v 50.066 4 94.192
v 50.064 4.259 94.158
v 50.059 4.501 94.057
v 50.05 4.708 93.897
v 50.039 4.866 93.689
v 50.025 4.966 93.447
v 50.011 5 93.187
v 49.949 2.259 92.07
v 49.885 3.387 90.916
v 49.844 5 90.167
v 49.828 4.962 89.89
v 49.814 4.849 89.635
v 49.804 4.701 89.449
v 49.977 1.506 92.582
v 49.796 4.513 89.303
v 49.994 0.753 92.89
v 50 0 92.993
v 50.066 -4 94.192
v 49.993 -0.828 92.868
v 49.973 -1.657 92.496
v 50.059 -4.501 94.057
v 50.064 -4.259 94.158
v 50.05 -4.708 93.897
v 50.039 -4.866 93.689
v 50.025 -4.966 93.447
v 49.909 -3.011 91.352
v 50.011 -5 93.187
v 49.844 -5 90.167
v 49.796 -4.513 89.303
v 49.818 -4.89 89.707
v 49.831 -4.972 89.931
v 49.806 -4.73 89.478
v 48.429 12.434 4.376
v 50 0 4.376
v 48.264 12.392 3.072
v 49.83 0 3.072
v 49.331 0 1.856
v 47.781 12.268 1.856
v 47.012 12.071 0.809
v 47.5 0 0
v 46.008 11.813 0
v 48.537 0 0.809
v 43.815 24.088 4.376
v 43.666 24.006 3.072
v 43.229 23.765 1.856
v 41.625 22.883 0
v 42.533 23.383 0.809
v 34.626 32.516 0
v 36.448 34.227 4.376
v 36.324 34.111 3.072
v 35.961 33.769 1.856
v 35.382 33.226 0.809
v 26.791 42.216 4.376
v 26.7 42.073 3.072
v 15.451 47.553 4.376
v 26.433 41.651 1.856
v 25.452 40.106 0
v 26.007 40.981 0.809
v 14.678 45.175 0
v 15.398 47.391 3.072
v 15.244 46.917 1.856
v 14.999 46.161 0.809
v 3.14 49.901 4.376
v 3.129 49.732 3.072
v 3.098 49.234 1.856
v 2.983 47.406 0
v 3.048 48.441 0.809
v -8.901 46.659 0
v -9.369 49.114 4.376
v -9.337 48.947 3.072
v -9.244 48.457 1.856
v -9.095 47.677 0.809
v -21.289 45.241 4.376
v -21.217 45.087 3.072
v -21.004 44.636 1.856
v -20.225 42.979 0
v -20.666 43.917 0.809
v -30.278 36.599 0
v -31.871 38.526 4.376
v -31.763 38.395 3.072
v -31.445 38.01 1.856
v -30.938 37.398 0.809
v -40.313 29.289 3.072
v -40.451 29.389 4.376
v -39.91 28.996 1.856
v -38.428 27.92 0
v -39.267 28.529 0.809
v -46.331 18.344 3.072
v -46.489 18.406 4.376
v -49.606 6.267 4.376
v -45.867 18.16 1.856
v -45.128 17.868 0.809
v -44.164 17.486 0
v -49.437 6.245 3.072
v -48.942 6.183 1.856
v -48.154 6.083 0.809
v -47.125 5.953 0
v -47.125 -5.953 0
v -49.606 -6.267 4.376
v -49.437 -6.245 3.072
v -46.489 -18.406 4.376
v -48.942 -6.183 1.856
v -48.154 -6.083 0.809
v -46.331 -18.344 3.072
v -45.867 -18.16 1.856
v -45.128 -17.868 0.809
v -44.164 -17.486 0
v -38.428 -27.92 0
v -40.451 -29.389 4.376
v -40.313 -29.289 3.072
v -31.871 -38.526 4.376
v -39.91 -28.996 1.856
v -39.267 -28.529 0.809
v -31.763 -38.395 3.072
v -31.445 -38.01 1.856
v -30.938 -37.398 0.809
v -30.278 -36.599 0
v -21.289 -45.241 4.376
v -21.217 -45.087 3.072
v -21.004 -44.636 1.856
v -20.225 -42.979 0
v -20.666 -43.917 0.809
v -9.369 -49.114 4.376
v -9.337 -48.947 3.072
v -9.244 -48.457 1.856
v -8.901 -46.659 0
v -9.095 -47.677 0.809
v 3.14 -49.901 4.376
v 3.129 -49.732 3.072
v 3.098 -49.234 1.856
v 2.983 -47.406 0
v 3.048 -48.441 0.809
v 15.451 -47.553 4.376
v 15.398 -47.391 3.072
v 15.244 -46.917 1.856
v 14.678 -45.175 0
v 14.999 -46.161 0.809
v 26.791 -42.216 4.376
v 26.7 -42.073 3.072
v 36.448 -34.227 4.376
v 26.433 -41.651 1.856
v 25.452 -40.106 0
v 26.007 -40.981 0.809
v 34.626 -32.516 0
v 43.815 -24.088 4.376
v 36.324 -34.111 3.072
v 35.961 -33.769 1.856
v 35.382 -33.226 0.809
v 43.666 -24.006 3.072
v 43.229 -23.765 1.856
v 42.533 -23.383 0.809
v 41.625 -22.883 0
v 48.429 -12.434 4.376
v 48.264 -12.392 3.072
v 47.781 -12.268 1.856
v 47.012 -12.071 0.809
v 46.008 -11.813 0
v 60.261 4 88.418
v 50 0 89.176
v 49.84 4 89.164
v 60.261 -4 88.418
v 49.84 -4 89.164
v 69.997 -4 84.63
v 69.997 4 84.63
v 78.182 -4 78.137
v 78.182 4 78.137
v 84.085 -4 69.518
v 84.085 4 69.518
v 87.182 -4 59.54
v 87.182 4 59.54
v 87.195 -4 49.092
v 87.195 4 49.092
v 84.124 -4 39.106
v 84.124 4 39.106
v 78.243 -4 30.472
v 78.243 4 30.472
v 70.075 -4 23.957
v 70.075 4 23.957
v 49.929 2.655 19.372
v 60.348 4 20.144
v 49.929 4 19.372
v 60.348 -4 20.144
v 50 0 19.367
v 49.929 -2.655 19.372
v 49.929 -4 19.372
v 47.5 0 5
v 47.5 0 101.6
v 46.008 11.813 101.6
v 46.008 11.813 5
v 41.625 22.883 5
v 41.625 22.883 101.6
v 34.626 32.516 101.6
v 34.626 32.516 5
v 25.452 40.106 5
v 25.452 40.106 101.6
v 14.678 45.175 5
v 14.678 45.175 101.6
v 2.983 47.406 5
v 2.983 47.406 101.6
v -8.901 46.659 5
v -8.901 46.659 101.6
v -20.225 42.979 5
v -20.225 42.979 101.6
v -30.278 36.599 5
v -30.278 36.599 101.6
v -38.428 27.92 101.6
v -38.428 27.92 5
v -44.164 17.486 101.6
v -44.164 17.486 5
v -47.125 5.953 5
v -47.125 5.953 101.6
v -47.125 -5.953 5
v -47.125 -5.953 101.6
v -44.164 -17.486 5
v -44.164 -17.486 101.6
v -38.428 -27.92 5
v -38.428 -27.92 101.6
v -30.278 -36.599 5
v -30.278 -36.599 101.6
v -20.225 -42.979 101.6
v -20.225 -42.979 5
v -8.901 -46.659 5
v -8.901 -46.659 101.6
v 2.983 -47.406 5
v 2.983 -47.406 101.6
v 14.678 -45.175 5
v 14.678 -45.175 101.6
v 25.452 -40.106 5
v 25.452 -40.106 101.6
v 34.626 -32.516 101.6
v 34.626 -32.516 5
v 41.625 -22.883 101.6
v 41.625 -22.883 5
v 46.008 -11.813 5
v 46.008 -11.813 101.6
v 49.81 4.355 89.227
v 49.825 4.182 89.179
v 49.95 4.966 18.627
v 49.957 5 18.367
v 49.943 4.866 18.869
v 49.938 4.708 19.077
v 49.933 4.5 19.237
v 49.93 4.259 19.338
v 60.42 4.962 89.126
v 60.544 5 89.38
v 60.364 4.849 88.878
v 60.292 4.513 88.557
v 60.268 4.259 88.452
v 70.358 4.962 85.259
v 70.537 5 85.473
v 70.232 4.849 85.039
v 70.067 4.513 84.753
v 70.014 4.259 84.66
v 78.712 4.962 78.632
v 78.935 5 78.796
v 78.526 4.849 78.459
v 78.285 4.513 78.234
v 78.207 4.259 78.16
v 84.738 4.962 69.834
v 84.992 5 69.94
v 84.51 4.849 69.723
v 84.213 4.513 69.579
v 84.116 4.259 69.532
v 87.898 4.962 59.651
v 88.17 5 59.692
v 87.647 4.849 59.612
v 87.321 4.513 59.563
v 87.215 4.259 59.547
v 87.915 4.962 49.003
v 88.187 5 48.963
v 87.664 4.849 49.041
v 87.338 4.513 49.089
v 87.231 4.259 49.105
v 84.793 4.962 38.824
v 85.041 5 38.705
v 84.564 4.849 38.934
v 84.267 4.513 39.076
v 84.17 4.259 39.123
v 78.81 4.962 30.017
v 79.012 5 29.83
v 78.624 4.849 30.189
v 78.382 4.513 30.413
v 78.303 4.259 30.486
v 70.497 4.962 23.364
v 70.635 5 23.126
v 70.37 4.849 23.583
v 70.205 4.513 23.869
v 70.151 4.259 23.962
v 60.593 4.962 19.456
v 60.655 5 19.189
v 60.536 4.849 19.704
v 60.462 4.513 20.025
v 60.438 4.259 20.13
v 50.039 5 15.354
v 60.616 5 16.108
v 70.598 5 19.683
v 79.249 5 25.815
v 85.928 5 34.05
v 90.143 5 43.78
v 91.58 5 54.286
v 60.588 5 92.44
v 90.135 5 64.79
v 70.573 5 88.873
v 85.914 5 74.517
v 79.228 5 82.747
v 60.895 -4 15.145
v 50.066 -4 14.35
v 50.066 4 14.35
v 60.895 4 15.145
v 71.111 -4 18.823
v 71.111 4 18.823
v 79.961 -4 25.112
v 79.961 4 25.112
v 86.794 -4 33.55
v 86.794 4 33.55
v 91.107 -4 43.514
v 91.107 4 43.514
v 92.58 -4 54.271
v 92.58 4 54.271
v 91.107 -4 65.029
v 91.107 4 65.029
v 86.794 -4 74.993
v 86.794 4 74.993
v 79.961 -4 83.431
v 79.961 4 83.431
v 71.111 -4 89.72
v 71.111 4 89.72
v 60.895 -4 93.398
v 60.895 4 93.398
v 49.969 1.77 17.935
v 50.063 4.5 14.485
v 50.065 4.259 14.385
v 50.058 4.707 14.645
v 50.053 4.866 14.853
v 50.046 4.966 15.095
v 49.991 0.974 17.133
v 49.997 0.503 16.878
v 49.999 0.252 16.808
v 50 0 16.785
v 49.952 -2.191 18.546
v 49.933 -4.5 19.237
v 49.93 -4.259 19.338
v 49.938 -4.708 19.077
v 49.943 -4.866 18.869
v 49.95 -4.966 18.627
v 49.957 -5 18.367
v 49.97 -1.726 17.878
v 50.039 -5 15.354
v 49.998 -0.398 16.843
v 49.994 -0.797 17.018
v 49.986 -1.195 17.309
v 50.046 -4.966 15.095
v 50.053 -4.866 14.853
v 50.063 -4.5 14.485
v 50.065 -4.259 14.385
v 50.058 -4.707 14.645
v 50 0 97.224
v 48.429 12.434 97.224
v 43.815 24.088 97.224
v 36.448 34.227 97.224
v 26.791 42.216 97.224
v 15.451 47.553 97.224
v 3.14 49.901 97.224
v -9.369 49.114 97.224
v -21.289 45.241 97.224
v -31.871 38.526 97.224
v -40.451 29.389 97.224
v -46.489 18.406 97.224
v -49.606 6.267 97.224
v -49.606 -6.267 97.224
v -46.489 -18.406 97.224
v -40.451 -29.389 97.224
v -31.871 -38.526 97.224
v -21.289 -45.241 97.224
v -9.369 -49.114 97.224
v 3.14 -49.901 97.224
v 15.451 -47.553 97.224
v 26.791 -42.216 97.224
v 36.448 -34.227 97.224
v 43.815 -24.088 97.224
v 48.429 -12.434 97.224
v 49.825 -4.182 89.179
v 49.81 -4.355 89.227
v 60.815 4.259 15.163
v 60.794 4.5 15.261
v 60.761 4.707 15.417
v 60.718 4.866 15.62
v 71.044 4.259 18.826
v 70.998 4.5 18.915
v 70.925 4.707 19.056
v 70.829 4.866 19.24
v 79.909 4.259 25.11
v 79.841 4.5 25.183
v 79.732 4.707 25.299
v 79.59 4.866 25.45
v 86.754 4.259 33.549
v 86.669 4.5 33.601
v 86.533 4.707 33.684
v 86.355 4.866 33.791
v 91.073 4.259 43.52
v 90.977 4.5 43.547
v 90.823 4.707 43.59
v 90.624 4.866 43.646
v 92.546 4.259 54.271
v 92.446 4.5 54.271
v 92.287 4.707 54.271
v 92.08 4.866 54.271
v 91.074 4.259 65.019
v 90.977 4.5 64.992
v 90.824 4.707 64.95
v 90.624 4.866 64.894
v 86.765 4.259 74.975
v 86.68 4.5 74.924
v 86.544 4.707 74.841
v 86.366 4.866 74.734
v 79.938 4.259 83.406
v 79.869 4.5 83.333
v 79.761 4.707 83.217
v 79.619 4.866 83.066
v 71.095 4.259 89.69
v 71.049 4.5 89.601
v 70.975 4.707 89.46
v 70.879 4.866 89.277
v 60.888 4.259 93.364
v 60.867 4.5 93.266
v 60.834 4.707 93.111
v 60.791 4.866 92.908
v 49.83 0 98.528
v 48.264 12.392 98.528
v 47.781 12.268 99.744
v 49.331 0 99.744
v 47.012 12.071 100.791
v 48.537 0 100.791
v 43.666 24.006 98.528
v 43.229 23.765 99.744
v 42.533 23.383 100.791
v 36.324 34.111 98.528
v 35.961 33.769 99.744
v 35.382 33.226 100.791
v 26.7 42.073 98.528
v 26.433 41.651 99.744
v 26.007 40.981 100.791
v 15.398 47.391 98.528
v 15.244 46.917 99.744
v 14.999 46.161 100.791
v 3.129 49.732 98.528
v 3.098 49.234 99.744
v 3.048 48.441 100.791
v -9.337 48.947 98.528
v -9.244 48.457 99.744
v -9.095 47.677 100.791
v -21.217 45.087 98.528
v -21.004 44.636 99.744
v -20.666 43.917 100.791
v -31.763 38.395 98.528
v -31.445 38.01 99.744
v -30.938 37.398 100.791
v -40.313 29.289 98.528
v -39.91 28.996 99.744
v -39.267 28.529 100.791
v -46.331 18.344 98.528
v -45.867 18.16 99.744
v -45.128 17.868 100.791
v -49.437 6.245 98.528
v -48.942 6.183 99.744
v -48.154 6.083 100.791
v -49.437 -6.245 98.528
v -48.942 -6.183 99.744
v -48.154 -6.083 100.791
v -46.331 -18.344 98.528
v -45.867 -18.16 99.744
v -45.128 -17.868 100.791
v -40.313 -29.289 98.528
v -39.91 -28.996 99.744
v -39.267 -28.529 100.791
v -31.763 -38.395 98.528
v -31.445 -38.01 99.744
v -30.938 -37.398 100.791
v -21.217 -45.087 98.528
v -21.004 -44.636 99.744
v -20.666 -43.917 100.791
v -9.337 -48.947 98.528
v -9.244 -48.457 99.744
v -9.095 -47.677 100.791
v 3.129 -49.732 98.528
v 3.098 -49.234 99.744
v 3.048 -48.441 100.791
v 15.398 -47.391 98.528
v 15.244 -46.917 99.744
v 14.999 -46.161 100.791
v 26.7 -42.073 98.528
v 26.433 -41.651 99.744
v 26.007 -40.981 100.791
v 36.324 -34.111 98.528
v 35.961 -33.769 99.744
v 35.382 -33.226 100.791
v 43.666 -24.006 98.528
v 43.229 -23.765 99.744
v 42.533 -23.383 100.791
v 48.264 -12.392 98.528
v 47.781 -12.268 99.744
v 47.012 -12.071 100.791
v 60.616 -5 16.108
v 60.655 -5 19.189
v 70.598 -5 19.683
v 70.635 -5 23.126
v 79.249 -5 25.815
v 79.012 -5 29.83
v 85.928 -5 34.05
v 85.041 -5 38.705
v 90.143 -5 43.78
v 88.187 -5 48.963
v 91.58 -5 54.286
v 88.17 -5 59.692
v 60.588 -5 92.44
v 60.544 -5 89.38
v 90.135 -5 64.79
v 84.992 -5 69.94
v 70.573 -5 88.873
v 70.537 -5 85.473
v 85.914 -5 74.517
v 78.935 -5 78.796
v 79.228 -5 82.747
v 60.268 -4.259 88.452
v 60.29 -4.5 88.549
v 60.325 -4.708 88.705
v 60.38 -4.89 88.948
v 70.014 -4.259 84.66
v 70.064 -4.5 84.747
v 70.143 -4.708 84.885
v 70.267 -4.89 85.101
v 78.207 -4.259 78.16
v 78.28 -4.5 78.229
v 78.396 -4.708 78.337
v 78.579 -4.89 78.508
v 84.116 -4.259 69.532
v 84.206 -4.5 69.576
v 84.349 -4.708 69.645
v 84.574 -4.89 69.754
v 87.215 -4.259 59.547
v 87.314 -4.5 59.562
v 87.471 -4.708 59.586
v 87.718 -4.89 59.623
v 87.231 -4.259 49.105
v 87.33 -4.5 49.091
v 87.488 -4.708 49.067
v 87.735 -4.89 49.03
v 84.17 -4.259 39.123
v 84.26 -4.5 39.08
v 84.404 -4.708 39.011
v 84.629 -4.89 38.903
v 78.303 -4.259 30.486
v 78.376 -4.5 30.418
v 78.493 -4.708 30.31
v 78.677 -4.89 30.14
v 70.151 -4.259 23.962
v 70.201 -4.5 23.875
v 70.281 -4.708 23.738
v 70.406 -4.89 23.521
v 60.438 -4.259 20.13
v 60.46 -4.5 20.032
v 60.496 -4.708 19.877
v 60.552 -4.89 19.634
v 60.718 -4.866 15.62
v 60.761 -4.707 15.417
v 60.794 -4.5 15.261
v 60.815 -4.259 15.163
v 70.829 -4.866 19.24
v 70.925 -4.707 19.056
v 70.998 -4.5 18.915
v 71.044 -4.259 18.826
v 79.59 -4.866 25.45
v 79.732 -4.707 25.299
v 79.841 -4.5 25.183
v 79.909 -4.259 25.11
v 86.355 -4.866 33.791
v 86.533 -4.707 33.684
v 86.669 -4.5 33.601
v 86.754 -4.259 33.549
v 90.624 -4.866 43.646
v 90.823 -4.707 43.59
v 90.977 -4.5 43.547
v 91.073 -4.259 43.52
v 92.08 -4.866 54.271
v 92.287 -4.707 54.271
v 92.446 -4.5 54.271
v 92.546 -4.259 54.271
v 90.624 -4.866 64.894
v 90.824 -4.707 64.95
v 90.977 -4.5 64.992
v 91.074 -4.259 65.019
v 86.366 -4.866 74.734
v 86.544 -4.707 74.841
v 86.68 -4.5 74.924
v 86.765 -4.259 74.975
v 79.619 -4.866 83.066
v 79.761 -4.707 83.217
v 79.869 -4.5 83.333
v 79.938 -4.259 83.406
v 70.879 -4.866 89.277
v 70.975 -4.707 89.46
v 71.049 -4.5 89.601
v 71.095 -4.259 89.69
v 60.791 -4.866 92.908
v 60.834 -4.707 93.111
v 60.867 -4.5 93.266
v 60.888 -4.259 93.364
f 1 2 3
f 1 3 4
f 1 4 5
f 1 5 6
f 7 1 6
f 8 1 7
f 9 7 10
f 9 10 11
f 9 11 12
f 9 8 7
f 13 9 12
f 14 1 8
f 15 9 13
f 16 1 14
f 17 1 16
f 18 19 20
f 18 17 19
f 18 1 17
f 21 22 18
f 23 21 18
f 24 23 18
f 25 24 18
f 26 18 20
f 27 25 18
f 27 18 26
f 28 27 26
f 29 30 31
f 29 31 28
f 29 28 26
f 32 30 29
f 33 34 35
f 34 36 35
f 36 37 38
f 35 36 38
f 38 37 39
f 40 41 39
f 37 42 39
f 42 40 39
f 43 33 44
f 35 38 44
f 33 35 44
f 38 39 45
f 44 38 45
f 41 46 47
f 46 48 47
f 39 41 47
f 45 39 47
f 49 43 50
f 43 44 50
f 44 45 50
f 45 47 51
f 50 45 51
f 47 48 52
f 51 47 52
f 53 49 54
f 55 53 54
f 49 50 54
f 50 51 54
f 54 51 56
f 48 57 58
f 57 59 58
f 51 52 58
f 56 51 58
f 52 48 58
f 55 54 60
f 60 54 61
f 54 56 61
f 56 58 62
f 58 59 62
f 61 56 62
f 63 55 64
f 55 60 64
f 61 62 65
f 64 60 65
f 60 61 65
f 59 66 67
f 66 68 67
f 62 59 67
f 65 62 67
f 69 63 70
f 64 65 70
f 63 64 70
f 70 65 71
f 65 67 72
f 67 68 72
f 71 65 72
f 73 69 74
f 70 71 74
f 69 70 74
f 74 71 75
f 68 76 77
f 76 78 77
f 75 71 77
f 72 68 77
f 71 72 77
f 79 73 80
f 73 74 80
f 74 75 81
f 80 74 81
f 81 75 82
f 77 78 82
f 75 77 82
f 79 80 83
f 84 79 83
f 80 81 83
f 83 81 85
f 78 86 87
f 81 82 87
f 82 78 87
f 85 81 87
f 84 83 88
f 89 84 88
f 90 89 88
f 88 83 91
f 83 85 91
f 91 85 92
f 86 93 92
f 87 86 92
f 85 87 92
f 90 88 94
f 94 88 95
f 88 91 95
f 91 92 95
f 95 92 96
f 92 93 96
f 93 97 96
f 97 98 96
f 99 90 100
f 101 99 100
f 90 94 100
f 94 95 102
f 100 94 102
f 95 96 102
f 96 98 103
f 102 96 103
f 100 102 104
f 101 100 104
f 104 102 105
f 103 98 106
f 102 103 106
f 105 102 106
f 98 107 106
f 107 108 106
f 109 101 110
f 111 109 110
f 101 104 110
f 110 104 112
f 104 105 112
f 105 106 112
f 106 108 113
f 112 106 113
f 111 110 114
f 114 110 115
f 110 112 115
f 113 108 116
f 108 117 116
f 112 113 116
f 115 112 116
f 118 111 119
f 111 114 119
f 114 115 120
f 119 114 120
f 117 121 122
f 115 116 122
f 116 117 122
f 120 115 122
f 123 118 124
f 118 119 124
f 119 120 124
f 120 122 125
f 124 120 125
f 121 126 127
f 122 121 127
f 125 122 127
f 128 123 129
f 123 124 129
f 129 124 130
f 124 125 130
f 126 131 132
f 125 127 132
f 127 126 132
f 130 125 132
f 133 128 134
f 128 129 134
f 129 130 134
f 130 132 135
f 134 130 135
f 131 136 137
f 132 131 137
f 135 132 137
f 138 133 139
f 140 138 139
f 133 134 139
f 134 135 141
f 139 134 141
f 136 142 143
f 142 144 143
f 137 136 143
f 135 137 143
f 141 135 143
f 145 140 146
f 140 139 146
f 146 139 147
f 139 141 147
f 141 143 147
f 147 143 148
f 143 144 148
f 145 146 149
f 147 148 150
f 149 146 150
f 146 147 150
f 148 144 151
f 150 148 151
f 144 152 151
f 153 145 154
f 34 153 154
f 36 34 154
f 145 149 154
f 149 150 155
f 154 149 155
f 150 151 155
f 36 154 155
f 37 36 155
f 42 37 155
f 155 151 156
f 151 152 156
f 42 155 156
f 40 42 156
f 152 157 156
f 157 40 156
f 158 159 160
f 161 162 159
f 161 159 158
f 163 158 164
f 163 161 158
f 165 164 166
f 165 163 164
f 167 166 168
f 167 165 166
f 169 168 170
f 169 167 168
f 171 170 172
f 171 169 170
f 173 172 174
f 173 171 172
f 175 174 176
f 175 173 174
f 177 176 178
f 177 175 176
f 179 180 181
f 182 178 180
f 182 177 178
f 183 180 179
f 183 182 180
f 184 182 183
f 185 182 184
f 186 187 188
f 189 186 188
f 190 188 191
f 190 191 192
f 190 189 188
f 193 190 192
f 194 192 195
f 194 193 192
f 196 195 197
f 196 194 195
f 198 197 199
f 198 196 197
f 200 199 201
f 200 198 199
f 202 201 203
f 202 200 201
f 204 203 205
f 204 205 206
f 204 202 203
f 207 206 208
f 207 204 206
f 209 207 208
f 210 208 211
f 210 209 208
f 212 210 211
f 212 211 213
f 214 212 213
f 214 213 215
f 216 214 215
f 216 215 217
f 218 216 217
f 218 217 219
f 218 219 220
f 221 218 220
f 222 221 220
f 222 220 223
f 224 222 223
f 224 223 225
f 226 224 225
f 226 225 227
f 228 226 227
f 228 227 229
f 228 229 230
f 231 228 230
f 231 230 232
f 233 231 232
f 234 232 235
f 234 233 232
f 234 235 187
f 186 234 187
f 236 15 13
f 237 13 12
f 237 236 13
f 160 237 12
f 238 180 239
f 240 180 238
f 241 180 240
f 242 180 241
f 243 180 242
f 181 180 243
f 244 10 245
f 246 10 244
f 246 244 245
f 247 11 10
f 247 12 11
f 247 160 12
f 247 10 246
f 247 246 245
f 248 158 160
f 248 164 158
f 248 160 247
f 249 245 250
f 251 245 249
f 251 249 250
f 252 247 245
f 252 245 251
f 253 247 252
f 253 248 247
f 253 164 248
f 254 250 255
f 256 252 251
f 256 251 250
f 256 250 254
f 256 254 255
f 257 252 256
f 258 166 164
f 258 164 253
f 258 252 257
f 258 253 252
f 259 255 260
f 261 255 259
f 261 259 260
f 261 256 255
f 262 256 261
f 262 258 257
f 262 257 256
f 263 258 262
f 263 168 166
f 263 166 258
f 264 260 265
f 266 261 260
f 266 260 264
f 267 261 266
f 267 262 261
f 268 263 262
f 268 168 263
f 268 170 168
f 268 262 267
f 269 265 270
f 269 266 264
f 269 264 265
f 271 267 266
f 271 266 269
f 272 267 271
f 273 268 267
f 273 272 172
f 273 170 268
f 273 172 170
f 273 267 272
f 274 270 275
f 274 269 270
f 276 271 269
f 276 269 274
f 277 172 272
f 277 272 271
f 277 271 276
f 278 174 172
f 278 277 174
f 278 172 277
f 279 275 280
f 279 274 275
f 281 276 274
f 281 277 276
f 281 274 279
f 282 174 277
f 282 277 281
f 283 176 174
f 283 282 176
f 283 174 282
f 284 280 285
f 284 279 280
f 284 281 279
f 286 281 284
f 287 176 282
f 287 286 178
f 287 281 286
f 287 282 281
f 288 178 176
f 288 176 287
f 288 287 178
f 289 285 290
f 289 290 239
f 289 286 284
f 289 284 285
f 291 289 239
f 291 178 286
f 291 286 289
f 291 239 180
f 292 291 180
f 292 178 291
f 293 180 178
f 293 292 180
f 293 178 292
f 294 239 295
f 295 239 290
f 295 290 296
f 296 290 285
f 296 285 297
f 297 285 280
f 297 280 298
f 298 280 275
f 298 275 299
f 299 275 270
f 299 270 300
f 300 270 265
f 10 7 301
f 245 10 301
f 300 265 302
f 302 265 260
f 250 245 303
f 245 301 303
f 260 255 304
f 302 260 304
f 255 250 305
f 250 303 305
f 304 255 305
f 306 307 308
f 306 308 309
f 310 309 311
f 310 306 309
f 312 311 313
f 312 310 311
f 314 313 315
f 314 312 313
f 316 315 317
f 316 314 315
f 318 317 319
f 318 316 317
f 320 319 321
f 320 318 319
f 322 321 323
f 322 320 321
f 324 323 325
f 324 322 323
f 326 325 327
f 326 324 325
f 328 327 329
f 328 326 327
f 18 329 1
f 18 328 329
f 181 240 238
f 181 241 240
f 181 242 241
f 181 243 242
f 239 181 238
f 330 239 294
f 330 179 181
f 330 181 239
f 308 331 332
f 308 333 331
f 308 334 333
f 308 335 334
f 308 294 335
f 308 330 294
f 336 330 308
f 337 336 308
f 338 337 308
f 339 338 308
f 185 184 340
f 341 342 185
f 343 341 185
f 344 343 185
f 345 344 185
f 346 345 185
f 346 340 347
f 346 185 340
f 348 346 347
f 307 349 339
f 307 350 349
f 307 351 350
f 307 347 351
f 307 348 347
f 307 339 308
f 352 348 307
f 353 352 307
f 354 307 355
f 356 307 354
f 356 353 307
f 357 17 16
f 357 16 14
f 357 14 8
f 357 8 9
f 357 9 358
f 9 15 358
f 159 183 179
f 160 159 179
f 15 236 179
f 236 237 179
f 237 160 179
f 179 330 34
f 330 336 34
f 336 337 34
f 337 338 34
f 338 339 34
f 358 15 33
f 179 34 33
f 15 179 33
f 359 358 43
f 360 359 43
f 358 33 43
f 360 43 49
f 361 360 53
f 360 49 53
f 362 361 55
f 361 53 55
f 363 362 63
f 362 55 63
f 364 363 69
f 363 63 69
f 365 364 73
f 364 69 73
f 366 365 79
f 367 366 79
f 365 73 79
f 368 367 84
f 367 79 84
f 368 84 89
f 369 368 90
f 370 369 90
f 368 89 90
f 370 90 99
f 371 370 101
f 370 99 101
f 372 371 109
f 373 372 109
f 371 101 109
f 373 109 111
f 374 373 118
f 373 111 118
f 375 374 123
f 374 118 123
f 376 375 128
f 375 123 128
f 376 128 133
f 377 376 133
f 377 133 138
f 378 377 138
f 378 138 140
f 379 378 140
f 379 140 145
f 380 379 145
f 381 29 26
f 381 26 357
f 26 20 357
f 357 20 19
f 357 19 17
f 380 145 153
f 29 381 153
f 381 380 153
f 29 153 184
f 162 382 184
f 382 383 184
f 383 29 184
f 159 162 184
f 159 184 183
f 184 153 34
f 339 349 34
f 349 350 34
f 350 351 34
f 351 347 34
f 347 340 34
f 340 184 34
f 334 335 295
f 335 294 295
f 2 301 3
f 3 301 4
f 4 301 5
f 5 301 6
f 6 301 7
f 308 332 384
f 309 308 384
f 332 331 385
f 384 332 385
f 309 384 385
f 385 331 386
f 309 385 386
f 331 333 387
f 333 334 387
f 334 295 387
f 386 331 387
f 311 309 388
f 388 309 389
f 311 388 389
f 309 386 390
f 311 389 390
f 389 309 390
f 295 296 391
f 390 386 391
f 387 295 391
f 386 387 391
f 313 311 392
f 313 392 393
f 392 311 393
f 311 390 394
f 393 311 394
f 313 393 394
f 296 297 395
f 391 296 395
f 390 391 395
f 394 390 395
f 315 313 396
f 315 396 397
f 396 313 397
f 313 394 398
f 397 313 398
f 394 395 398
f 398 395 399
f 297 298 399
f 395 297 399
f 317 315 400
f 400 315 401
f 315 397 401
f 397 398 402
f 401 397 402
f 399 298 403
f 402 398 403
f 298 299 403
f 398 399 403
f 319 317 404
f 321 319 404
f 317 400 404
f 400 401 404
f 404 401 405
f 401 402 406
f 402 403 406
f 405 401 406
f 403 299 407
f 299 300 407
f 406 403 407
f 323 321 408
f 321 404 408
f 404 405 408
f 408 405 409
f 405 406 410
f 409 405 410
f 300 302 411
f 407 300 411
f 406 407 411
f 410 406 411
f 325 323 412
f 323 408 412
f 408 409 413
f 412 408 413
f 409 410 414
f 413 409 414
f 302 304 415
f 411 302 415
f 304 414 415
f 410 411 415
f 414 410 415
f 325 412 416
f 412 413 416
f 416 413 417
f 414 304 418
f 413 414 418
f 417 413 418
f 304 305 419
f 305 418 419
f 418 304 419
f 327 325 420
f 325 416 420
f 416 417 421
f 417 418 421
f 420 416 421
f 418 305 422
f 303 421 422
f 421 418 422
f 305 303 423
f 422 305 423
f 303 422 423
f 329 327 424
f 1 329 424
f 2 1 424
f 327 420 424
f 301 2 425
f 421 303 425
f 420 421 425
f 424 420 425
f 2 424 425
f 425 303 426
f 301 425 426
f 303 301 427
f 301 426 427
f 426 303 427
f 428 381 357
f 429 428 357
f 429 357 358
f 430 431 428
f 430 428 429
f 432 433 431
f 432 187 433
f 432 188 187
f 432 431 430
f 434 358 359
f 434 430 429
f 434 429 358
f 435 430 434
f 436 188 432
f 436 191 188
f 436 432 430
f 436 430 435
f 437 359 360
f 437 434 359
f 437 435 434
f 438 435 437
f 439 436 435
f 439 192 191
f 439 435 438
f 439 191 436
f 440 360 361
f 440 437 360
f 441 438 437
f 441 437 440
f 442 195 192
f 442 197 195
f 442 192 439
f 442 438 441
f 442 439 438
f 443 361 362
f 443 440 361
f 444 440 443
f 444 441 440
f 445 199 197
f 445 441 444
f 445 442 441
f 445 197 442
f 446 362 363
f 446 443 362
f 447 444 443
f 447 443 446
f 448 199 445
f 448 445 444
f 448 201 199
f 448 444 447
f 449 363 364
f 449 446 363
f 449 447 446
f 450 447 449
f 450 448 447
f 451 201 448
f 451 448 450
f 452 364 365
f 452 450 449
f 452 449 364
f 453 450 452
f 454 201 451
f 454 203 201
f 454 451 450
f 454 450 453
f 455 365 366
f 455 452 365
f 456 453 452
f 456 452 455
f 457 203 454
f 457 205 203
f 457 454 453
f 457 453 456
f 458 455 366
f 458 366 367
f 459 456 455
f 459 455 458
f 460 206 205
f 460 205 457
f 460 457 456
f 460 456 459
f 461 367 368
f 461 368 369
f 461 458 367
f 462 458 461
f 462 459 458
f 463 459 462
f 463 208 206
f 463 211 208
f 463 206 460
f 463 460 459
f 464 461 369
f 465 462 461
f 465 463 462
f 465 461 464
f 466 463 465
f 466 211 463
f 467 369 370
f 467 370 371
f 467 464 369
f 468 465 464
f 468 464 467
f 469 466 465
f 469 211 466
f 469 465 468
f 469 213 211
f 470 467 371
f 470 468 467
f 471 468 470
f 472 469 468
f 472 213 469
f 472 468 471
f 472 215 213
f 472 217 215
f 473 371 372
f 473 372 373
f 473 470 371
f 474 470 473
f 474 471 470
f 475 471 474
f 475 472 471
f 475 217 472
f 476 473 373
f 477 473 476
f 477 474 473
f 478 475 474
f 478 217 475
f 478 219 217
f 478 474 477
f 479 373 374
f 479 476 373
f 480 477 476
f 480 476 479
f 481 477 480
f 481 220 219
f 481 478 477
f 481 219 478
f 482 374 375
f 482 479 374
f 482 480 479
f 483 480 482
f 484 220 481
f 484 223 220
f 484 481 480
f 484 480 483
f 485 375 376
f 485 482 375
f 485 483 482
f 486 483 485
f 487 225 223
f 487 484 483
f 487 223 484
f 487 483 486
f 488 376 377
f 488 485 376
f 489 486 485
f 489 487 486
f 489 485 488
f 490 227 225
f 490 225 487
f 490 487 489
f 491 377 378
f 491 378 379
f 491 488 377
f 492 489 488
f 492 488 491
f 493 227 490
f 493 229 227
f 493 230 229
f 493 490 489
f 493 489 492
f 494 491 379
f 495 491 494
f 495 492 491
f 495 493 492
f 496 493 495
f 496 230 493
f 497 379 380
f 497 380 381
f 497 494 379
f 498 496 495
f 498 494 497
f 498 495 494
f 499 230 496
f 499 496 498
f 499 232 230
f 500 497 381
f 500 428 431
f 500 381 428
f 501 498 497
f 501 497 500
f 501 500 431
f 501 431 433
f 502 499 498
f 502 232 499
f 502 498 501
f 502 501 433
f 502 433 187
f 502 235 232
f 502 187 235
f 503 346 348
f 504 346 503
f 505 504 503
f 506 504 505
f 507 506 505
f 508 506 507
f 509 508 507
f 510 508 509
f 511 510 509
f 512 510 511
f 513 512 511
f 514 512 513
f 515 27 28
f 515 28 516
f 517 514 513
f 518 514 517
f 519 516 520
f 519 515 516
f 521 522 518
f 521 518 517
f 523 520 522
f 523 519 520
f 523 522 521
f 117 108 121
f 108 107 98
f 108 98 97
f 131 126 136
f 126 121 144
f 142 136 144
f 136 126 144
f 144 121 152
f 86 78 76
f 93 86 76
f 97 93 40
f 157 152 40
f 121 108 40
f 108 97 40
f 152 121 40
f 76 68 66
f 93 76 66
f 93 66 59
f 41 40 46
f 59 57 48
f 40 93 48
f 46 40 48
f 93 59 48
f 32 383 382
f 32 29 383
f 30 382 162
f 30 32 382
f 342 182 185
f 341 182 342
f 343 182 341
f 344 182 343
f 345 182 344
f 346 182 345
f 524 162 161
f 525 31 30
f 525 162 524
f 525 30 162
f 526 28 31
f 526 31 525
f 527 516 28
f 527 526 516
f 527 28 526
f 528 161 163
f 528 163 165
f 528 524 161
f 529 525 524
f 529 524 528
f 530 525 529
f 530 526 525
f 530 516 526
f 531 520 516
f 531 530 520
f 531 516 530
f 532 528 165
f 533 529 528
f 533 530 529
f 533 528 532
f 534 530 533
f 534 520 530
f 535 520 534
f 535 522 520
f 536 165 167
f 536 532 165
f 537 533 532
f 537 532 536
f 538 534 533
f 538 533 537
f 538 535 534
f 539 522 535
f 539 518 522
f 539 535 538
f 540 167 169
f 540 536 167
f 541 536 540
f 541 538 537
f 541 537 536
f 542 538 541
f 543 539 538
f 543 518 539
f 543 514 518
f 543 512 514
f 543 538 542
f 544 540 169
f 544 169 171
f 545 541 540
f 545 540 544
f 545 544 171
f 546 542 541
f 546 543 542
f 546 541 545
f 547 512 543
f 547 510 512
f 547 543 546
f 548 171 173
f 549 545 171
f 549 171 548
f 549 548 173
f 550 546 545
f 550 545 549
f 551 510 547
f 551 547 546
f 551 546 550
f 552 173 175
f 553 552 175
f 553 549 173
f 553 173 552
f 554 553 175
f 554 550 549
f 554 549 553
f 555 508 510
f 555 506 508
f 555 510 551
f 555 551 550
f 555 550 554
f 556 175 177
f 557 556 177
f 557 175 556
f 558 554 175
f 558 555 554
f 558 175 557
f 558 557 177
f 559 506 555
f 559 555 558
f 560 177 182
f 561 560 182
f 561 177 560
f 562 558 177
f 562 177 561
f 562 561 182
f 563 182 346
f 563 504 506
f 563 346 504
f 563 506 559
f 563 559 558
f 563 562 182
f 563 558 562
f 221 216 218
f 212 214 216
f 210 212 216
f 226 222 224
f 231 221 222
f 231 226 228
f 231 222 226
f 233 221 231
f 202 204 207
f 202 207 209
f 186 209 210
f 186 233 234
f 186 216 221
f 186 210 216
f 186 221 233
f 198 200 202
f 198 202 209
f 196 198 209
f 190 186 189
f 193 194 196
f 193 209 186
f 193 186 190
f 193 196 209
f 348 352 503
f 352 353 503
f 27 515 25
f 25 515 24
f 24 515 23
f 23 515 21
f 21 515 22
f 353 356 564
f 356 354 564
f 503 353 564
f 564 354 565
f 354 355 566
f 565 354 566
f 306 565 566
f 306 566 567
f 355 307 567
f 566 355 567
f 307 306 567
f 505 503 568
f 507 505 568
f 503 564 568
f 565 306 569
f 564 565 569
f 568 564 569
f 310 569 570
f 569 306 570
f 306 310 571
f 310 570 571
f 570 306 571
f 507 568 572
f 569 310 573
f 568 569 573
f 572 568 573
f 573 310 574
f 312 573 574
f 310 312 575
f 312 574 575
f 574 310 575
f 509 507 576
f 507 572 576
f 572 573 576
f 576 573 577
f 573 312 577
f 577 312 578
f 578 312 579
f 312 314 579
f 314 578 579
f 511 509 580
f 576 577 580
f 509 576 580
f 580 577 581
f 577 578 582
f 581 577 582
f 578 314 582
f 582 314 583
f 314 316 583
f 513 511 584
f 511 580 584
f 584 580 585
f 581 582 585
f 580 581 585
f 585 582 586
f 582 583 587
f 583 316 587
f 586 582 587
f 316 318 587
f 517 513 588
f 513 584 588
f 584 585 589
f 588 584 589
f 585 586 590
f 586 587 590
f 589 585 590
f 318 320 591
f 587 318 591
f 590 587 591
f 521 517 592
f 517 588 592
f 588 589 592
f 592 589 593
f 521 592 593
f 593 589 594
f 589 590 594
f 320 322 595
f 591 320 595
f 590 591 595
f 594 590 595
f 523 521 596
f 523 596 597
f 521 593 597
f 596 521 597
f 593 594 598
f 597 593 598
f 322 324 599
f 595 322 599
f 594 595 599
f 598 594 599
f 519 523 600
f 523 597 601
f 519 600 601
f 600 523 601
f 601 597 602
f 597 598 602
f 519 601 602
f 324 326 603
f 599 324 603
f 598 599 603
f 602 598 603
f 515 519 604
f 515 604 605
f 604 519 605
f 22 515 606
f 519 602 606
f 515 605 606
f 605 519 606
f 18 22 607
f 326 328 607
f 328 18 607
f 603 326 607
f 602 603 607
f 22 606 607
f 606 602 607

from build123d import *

# Parameters (mm, degrees)
F0_R     = 50
F0_R_2   = 47.5
F1_DEPTH = 101.6
F4_DEPTH = 5
F6_DEPTH = 5
F7_F1_R  = 1
F7_F2_R  = 1
F7_F3_R  = 1
F7_F4_R  = 1


# Not quite as in the source:
# - a fillet or chamfer that OpenCascade refuses, or shapes differently, is made with other operations: its cross-section is extruded or revolved along the edge and cut away or added


with BuildPart() as f1:
    # F0 (on Top) → F1 (new body)
    with BuildSketch(Plane.XY):
        Circle(F0_R)
        Circle(F0_R_2, mode=Mode.SUBTRACT)
    extrude(amount=F1_DEPTH)

    # F2: fillet of radius 5.08 on 1 edges, made by hand

    # F2_s1 → F2_t2 (revolve, cut)
    with BuildSketch(Plane.XZ):
        with BuildLine():
            ThreePointArc((50, 97.2239287026), (49.3309409427, 99.7438493363), (47.5, 101.6))
            Line((47.5, 101.6), (50, 101.6))
            Line((50, 101.6), (50, 97.2239287026))
        make_face()
    revolve(axis=Axis((0, 0, 101.6), (0, 0, 1)), mode=Mode.SUBTRACT)

    # F3: fillet of radius 5.08 on 1 edges, made by hand

    # F3_s1 → F3_t2 (revolve, cut)
    with BuildSketch(Plane.XZ):
        with BuildLine():
            ThreePointArc((50, 4.3760712974), (49.3309409427, 1.8561506637), (47.5, 0))
            Line((47.5, 0), (50, 0))
            Line((50, 0), (50, 4.3760712974))
        make_face()
    revolve(axis=Axis((0, 0, 0), (0, 0, 1)), mode=Mode.SUBTRACT)

    # F0 (on Top) → F4 (join)
    with BuildSketch(Plane.XY):
        Circle(F0_R_2)
    extrude(amount=F4_DEPTH)

    # F5 (on Front) → F6 (join, symmetric)
    with BuildSketch(Plane.XZ):
        with BuildLine():
            Line((49.9294716591, 19.3719161714), (50.0663593411, 14.3504645675))
            ThreePointArc((50.0663593411, 14.3504645675), (92.5802970628, 54.2713878676), (50.0663593411, 94.1923111677))
            Line((50.0663593411, 94.1923111677), (49.7880062733, 89.1598259546))
            ThreePointArc((49.7880062733, 89.1598259546), (87.5802251549, 54.3423353762), (49.9294716591, 19.3719161714))
        make_face()
    extrude(amount=F6_DEPTH, both=True)

    # F7: fillet of radius 1 on 4 edges, made by hand

    # F7_f1
    f7_f1_edges = [f1.edges().sort_by_distance(p)[0] for p in [
        (87.5802251549, -5, 54.3423353762),
    ]]
    fillet(f7_f1_edges, radius=F7_F1_R)

    # F7_f2
    f7_f2_edges = [f1.edges().sort_by_distance(p)[0] for p in [
        (92.5802970628, -5, 54.2713878676),
    ]]
    fillet(f7_f2_edges, radius=F7_F2_R)

    # F7_f3
    f7_f3_edges = [f1.edges().sort_by_distance(p)[0] for p in [
        (92.5802970628, 5, 54.2713878676),
    ]]
    fillet(f7_f3_edges, radius=F7_F3_R)

    # F7_f4
    f7_f4_edges = [f1.edges().sort_by_distance(p)[0] for p in [
        (87.5802251549, 5, 54.3423353762),
    ]]
    fillet(f7_f4_edges, radius=F7_F4_R)


solid = f1.part
